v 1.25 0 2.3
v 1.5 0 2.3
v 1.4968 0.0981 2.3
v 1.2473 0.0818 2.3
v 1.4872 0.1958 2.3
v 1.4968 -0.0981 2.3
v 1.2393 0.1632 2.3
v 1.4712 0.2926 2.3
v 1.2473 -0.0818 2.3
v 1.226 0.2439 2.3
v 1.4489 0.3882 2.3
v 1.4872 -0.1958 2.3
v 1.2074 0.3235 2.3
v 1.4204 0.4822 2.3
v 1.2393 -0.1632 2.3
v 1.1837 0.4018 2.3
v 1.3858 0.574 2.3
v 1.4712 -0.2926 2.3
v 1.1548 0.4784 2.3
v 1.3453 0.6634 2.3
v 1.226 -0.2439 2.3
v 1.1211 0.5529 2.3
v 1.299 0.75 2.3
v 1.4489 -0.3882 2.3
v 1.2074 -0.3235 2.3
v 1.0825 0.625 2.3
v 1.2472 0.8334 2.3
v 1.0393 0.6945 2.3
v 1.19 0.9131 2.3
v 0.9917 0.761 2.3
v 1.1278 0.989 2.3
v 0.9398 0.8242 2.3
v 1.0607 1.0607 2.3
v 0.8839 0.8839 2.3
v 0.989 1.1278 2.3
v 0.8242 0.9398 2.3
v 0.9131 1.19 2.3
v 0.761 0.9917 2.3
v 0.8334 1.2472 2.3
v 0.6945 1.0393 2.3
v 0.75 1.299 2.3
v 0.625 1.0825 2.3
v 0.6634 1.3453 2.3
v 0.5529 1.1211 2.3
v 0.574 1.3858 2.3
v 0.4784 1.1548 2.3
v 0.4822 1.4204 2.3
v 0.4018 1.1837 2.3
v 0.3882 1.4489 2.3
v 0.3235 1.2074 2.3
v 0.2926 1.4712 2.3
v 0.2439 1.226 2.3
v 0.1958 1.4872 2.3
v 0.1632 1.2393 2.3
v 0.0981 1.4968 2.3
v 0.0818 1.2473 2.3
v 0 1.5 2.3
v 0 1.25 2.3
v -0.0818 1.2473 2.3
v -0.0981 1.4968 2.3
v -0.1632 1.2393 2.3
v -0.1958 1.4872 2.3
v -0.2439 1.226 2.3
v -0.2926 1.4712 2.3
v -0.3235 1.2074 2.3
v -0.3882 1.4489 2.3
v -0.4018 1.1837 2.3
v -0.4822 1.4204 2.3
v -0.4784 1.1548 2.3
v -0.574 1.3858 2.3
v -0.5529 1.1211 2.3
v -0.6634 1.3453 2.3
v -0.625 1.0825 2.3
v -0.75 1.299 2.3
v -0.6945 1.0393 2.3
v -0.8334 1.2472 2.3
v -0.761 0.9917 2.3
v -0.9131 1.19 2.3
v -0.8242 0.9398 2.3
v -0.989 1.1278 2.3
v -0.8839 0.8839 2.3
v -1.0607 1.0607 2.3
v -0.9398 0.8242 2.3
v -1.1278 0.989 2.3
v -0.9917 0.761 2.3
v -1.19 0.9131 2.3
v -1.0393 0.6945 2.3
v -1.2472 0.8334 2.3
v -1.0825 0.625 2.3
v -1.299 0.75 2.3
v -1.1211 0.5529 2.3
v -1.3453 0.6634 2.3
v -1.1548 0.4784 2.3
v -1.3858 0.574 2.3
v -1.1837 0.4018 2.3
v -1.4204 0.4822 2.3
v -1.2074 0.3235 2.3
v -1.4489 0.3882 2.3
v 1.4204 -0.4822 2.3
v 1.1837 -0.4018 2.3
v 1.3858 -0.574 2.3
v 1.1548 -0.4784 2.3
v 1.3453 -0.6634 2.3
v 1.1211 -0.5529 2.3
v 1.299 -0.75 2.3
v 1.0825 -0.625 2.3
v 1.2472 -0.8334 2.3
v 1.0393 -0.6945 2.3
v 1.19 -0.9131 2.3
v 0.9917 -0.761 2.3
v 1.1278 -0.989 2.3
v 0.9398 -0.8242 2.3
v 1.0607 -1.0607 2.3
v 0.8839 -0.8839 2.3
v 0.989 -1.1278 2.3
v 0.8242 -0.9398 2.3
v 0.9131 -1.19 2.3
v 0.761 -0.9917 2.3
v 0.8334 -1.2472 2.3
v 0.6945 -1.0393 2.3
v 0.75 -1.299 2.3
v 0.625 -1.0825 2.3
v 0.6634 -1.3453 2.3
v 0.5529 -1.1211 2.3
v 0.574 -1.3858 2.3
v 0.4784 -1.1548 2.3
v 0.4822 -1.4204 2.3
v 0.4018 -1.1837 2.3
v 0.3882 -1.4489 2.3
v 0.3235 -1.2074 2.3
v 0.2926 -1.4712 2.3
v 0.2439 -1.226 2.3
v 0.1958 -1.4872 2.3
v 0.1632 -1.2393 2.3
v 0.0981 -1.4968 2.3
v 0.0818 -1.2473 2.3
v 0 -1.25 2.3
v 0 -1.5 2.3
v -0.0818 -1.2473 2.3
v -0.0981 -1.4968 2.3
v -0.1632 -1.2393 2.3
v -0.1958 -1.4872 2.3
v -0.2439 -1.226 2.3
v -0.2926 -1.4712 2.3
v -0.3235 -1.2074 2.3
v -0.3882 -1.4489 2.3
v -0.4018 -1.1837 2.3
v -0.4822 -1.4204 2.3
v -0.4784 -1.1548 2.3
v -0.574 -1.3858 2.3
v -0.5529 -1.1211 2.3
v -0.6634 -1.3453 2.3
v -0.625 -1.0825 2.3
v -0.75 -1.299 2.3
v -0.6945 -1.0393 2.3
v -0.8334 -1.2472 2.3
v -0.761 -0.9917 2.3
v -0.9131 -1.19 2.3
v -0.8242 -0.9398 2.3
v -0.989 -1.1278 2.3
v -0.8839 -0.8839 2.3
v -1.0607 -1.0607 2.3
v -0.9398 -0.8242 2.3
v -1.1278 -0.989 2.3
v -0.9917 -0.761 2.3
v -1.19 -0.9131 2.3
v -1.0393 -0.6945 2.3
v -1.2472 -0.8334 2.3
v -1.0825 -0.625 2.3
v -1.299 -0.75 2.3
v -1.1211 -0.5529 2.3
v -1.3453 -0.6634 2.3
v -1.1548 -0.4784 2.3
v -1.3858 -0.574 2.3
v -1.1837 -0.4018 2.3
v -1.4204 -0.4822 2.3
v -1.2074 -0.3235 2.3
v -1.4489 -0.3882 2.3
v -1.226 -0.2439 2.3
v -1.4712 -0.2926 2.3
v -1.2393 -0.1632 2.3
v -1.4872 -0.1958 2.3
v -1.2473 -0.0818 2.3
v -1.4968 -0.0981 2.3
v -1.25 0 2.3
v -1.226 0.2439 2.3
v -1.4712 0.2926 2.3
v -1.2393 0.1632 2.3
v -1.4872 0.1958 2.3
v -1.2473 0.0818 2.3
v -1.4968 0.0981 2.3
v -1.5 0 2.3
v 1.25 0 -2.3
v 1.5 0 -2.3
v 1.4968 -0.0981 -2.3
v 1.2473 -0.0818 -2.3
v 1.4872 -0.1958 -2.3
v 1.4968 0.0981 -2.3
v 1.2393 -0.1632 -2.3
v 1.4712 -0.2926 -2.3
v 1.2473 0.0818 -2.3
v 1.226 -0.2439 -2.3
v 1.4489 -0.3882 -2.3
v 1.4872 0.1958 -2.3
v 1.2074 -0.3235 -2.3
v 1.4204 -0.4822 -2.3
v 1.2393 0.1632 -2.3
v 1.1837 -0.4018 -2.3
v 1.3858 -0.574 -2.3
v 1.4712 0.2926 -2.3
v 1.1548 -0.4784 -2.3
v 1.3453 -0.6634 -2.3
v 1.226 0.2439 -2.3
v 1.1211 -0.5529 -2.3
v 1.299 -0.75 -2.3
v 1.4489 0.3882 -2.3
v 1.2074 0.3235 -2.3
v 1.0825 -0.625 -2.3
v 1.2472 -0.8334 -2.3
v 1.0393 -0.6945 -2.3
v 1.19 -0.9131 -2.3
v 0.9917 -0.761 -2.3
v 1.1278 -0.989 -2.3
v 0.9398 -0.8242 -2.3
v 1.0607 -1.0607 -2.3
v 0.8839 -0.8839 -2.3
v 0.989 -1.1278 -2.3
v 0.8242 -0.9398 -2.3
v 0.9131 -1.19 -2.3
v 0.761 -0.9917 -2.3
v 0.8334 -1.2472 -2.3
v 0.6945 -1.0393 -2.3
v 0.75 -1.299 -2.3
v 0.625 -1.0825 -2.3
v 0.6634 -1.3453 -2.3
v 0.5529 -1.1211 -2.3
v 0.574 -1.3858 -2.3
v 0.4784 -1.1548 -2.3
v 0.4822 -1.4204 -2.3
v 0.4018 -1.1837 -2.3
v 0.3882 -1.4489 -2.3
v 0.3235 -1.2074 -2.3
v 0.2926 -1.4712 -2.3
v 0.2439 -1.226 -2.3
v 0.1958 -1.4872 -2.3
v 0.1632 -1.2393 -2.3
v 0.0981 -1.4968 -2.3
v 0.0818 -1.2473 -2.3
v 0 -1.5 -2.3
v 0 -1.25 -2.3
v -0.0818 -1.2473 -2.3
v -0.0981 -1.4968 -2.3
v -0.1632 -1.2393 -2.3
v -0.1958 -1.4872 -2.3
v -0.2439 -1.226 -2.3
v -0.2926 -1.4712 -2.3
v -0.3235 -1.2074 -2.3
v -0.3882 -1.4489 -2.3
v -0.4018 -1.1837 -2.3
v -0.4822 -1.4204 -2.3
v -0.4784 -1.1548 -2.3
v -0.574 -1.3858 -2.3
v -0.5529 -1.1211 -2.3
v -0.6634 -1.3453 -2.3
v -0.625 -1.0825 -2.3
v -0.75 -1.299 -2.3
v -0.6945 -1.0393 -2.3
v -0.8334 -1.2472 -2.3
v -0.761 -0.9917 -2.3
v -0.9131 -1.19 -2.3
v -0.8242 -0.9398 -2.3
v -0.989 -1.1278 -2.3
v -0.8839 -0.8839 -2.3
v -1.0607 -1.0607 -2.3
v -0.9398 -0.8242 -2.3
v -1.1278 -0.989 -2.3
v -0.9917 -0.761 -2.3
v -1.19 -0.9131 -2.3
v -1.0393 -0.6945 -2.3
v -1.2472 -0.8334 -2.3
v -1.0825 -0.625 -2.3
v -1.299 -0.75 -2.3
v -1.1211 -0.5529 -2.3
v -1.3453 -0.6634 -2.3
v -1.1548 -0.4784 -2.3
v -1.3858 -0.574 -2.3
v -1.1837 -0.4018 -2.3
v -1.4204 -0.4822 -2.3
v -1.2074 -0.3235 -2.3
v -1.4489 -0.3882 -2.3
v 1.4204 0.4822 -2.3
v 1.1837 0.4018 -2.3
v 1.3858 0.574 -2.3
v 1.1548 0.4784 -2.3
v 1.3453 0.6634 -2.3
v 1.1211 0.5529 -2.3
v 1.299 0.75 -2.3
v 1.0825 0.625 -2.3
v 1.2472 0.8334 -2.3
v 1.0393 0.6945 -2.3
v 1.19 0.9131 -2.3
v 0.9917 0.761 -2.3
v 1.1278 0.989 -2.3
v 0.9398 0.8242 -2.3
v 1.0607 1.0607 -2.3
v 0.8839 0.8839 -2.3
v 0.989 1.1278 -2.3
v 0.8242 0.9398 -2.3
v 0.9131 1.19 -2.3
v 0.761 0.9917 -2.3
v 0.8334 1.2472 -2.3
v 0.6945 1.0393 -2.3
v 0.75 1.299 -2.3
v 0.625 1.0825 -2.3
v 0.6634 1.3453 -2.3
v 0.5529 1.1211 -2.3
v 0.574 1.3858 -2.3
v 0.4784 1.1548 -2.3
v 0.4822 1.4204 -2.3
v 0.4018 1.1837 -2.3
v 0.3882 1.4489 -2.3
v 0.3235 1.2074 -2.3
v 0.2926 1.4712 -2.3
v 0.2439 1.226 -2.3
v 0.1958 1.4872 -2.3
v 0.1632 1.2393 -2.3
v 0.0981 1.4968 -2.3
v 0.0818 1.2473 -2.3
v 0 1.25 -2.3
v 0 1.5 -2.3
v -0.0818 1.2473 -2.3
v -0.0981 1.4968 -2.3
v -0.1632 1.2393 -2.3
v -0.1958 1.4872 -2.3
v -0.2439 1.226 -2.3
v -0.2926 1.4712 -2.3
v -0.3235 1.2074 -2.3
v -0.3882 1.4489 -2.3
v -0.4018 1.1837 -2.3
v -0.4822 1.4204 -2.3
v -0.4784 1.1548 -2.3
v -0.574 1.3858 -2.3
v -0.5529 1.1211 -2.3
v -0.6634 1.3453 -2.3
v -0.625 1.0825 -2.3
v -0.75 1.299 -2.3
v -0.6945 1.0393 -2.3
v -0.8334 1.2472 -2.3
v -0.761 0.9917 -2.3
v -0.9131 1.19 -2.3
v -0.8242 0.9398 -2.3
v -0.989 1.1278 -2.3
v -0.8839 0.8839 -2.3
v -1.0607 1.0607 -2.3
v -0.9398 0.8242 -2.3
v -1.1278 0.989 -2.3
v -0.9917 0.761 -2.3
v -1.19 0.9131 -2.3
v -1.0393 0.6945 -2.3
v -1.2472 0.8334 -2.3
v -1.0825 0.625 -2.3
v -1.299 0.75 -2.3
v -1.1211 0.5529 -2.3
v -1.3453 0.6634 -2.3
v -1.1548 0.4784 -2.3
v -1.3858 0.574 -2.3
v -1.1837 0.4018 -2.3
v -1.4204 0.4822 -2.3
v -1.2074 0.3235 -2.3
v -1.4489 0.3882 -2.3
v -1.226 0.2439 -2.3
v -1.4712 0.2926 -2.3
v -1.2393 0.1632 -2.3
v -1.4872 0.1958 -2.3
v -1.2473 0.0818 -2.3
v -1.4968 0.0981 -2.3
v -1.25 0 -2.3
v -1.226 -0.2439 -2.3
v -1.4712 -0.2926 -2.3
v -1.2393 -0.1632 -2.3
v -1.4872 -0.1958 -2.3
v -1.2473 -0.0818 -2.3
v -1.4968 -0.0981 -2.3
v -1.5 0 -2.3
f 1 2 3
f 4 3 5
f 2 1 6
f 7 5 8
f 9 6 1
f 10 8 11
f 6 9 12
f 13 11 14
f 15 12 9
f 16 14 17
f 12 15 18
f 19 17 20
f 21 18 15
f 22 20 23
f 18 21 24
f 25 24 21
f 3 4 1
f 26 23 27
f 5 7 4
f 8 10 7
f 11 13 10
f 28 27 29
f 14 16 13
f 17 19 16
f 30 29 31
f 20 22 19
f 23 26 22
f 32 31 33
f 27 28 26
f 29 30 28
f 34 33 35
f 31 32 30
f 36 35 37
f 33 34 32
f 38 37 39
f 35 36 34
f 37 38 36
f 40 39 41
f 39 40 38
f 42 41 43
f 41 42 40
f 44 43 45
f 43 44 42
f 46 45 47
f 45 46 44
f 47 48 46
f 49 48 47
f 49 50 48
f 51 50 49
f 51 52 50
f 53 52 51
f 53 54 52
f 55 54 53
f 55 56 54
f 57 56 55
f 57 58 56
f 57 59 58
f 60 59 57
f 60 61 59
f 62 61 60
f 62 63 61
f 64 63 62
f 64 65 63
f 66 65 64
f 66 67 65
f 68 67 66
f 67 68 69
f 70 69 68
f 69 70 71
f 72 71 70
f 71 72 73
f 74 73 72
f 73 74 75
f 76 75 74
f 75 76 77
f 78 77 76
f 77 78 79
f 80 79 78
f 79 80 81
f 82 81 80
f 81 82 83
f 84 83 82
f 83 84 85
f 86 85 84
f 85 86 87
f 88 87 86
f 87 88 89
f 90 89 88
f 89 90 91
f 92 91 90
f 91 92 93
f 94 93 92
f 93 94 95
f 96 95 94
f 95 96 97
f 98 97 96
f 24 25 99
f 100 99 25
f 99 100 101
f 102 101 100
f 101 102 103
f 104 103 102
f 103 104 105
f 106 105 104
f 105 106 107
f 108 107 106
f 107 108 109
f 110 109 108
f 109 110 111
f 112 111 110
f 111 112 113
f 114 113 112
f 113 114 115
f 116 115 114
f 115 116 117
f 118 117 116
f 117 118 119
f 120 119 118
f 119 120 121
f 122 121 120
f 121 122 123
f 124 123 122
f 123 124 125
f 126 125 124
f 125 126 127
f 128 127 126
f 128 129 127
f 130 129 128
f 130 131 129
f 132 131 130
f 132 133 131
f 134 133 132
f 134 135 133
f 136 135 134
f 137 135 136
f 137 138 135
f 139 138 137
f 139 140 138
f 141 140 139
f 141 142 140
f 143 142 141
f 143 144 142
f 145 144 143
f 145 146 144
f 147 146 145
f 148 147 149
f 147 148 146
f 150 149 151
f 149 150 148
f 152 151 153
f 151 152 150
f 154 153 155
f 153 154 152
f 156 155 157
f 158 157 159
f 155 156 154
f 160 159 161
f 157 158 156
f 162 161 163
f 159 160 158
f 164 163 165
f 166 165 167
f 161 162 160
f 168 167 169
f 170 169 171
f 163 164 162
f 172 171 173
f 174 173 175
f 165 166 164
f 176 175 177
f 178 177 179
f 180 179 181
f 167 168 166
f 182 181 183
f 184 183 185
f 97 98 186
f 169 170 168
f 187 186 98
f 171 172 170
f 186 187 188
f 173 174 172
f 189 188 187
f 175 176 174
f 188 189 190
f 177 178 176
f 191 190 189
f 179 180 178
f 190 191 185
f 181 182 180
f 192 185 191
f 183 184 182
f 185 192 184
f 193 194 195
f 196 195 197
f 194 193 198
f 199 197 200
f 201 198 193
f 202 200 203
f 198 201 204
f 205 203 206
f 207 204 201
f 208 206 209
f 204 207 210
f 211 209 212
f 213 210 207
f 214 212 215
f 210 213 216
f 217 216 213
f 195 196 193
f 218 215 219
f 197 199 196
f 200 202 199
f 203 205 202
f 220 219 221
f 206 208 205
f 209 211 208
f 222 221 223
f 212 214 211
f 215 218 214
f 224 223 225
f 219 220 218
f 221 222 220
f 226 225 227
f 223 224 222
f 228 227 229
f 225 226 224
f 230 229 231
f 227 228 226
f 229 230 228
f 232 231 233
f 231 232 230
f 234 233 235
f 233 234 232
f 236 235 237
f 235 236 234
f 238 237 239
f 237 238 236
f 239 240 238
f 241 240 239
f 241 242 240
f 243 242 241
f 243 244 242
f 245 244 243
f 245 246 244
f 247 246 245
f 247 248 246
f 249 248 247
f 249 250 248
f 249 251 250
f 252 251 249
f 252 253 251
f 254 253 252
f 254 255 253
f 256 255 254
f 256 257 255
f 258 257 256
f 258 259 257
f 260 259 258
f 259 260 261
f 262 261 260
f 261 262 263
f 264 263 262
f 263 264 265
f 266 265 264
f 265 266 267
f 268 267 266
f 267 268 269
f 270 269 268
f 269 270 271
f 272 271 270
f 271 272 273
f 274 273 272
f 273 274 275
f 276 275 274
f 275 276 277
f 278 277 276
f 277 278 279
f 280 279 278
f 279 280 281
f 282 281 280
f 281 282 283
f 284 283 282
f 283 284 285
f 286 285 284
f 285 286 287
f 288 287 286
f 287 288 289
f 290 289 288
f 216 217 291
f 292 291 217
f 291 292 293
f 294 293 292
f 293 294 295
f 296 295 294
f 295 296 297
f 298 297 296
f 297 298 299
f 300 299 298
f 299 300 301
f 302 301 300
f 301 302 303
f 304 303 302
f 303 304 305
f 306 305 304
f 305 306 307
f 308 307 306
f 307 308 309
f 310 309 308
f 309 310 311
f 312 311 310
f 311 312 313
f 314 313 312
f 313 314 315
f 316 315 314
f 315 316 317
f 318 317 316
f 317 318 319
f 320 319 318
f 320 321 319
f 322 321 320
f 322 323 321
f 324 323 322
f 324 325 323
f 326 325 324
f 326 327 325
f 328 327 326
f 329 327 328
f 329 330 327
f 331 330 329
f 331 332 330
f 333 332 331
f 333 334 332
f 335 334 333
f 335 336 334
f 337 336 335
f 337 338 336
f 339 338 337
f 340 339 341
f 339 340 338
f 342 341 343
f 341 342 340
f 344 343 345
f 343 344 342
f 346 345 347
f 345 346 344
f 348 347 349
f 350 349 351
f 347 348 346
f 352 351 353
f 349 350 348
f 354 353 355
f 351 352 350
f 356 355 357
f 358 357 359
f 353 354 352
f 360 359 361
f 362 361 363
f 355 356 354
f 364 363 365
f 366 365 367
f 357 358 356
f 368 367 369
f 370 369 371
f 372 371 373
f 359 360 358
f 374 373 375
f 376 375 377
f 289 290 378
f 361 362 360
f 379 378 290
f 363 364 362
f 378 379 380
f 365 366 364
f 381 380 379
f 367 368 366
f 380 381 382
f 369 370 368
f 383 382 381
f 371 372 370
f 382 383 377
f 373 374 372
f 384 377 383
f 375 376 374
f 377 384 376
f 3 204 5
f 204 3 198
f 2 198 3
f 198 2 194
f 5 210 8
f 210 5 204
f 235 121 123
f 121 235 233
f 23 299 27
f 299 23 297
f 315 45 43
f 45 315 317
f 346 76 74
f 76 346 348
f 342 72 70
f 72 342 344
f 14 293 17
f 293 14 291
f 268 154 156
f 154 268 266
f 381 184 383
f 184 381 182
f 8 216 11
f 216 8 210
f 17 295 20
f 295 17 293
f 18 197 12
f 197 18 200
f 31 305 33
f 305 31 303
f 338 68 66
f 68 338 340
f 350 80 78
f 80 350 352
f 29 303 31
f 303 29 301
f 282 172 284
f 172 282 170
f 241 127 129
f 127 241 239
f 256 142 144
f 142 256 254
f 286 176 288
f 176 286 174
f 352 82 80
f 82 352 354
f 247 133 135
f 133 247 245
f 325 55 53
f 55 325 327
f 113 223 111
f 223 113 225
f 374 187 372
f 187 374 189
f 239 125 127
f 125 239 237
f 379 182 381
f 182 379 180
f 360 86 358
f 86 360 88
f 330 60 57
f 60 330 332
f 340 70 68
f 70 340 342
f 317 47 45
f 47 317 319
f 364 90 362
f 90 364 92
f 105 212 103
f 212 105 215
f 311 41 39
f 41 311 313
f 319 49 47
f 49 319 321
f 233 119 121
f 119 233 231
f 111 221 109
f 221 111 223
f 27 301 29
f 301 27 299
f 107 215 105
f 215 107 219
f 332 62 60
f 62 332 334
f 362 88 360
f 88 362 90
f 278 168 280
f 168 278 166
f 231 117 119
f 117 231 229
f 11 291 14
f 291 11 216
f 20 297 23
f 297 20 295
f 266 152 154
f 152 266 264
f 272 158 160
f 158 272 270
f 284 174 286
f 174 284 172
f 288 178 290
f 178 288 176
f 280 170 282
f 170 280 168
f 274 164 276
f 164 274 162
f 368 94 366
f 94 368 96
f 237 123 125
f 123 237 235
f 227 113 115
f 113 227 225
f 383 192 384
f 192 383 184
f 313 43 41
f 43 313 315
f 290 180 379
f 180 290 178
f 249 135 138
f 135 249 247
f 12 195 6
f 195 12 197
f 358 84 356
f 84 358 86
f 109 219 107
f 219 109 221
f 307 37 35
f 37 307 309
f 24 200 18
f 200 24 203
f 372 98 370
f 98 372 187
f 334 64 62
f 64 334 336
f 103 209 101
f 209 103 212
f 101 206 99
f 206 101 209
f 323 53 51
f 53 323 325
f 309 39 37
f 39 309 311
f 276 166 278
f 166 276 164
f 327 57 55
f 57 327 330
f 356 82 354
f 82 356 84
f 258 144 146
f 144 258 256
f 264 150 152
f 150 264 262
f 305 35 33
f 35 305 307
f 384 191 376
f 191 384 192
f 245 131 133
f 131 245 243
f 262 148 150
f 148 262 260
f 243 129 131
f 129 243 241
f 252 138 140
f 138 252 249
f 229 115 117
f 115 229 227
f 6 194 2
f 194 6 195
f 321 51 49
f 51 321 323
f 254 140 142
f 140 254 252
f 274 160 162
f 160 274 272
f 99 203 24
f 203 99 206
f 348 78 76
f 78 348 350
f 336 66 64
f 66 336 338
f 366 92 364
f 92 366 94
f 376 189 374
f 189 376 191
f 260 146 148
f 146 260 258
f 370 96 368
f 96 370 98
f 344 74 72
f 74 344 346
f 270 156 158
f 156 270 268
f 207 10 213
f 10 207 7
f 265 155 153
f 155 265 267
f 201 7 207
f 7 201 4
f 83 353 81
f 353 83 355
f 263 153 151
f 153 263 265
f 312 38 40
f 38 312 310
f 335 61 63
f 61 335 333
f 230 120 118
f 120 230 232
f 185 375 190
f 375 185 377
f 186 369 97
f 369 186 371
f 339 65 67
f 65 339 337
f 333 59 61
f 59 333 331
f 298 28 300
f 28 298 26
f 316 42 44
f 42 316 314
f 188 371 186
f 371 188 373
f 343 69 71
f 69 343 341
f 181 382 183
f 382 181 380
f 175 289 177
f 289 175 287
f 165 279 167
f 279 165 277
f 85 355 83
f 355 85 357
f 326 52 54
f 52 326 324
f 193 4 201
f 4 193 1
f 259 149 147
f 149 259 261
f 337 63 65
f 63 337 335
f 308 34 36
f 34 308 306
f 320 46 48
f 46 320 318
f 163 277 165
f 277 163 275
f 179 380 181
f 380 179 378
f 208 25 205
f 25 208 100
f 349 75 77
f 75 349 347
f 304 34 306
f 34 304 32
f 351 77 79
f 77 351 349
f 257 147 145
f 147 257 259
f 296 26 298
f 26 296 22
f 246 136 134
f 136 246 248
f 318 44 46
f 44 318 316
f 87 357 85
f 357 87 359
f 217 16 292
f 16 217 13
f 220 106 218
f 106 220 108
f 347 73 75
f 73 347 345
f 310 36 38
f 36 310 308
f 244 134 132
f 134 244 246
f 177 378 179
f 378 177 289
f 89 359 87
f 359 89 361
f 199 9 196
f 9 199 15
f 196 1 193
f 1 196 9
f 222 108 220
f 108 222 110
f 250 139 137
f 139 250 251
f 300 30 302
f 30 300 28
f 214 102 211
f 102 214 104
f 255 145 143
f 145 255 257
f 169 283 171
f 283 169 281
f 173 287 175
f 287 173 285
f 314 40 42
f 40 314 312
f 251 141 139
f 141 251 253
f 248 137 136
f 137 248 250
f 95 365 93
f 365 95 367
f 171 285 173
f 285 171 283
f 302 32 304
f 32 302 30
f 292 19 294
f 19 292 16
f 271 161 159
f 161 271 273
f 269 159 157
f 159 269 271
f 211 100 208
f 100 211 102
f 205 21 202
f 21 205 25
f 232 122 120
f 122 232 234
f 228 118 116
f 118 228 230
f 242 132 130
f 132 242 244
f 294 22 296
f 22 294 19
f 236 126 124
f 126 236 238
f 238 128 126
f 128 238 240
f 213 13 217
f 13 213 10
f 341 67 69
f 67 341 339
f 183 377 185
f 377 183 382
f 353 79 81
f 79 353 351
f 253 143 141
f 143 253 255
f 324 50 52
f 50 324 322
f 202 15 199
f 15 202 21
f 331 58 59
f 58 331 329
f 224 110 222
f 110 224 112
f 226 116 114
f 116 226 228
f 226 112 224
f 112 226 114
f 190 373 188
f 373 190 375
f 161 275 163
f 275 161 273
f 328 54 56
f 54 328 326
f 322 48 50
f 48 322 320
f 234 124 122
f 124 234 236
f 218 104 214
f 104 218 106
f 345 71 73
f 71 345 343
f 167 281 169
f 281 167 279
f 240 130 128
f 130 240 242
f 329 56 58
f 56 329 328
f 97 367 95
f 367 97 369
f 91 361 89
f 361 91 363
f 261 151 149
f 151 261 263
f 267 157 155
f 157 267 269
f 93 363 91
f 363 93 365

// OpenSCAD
// Threaded heat-set insert (visual model)
// Target: 3.0mm OD, 4.6mm long, for M3 screws

screw_nominal_diameter = 3; //[1.5:6:0.1]
outer_diameter = 3; //[1.5:6:0.1]
length = 4.6; //[2.3:9.2:0.1]
tolerance_outer_diameter = 0; //[-0.2:0.2:0.01]
tolerance_length = 0; //[-0.3:0.3:0.01]
chamfer_length = 0.3; //[0.1:1:0.05]
chamfer_angle_deg = 45; //[20:70:1]
inner_thread_clearance_diameter = 3.2; //[2.6:4:0.05]
rib_count = 12; //[6:24:1]
rib_radial_height = 0.25; //[0.1:0.6:0.05]
rib_tangential_width = 0.5; //[0.2:1.2:0.05]
rib_axial_margin = 0.4; //[0.2:1.2:0.05]
overlap = 0.8; //[0.2:2:0.1]
eps = 0.05; //[0.01:0.2:0.01]

module threaded_insert() {
  od = outer_diameter + tolerance_outer_diameter;
  h  = length + tolerance_length;

  od_r = max(od/2, 0.2);
  h2   = max(h/2, 0.2);

  // Ensure a real wall thickness so the model is visible/solid even if clearance >= OD
  min_wall = 0.25; // mm
  bore_r_req = max(inner_thread_clearance_diameter/2, 0.01);
  bore_r = min(bore_r_req, max(od_r - min_wall, 0.01));

  // Ribs: keep within OD and ensure they overlap into the body
  rib_h = max(rib_radial_height, 0);
  rib_w = max(rib_tangential_width, 0.05);
  rib_len = max(h - 2*rib_axial_margin, 0.2);

  // Place ribs so their outer face is at od_r, and they overlap inward by "overlap"
  rib_center_r = od_r - rib_h/2 - max(overlap, 0);

  // Chamfer
  cham_h = min(max(chamfer_length, 0), h/2);
  cham_r2 = max(od_r - cham_h, 0.01);

  color([0.8, 0.6, 0.2])
  difference() {
    union() {
      // Main body
      cylinder(r=od_r, h=h, center=true, $fn=96);

      // Lead-in chamfers (both ends), connected by construction
      if (cham_h > 0) {
        translate([0, 0,  h2 - cham_h/2])
          cylinder(r1=od_r, r2=cham_r2, h=cham_h, center=true, $fn=96);
        translate([0, 0, -h2 + cham_h/2])
          cylinder(r1=cham_r2, r2=od_r, h=cham_h, center=true, $fn=96);
      }

      // Outer ribs/knurls (connected)
      if (rib_h > 0) {
        for (i = [0:rib_count-1]) {
          rotate([0, 0, i * 360 / rib_count])
            translate([rib_center_r, 0, 0])
              cube([rib_h + 2*eps, rib_w, rib_len], center=true);
        }
      }
    }

    // Internal clearance hole (represents threaded bore)
    cylinder(r=bore_r, h=h + 2*eps, center=true, $fn=96);
  }
}

threaded_insert();
